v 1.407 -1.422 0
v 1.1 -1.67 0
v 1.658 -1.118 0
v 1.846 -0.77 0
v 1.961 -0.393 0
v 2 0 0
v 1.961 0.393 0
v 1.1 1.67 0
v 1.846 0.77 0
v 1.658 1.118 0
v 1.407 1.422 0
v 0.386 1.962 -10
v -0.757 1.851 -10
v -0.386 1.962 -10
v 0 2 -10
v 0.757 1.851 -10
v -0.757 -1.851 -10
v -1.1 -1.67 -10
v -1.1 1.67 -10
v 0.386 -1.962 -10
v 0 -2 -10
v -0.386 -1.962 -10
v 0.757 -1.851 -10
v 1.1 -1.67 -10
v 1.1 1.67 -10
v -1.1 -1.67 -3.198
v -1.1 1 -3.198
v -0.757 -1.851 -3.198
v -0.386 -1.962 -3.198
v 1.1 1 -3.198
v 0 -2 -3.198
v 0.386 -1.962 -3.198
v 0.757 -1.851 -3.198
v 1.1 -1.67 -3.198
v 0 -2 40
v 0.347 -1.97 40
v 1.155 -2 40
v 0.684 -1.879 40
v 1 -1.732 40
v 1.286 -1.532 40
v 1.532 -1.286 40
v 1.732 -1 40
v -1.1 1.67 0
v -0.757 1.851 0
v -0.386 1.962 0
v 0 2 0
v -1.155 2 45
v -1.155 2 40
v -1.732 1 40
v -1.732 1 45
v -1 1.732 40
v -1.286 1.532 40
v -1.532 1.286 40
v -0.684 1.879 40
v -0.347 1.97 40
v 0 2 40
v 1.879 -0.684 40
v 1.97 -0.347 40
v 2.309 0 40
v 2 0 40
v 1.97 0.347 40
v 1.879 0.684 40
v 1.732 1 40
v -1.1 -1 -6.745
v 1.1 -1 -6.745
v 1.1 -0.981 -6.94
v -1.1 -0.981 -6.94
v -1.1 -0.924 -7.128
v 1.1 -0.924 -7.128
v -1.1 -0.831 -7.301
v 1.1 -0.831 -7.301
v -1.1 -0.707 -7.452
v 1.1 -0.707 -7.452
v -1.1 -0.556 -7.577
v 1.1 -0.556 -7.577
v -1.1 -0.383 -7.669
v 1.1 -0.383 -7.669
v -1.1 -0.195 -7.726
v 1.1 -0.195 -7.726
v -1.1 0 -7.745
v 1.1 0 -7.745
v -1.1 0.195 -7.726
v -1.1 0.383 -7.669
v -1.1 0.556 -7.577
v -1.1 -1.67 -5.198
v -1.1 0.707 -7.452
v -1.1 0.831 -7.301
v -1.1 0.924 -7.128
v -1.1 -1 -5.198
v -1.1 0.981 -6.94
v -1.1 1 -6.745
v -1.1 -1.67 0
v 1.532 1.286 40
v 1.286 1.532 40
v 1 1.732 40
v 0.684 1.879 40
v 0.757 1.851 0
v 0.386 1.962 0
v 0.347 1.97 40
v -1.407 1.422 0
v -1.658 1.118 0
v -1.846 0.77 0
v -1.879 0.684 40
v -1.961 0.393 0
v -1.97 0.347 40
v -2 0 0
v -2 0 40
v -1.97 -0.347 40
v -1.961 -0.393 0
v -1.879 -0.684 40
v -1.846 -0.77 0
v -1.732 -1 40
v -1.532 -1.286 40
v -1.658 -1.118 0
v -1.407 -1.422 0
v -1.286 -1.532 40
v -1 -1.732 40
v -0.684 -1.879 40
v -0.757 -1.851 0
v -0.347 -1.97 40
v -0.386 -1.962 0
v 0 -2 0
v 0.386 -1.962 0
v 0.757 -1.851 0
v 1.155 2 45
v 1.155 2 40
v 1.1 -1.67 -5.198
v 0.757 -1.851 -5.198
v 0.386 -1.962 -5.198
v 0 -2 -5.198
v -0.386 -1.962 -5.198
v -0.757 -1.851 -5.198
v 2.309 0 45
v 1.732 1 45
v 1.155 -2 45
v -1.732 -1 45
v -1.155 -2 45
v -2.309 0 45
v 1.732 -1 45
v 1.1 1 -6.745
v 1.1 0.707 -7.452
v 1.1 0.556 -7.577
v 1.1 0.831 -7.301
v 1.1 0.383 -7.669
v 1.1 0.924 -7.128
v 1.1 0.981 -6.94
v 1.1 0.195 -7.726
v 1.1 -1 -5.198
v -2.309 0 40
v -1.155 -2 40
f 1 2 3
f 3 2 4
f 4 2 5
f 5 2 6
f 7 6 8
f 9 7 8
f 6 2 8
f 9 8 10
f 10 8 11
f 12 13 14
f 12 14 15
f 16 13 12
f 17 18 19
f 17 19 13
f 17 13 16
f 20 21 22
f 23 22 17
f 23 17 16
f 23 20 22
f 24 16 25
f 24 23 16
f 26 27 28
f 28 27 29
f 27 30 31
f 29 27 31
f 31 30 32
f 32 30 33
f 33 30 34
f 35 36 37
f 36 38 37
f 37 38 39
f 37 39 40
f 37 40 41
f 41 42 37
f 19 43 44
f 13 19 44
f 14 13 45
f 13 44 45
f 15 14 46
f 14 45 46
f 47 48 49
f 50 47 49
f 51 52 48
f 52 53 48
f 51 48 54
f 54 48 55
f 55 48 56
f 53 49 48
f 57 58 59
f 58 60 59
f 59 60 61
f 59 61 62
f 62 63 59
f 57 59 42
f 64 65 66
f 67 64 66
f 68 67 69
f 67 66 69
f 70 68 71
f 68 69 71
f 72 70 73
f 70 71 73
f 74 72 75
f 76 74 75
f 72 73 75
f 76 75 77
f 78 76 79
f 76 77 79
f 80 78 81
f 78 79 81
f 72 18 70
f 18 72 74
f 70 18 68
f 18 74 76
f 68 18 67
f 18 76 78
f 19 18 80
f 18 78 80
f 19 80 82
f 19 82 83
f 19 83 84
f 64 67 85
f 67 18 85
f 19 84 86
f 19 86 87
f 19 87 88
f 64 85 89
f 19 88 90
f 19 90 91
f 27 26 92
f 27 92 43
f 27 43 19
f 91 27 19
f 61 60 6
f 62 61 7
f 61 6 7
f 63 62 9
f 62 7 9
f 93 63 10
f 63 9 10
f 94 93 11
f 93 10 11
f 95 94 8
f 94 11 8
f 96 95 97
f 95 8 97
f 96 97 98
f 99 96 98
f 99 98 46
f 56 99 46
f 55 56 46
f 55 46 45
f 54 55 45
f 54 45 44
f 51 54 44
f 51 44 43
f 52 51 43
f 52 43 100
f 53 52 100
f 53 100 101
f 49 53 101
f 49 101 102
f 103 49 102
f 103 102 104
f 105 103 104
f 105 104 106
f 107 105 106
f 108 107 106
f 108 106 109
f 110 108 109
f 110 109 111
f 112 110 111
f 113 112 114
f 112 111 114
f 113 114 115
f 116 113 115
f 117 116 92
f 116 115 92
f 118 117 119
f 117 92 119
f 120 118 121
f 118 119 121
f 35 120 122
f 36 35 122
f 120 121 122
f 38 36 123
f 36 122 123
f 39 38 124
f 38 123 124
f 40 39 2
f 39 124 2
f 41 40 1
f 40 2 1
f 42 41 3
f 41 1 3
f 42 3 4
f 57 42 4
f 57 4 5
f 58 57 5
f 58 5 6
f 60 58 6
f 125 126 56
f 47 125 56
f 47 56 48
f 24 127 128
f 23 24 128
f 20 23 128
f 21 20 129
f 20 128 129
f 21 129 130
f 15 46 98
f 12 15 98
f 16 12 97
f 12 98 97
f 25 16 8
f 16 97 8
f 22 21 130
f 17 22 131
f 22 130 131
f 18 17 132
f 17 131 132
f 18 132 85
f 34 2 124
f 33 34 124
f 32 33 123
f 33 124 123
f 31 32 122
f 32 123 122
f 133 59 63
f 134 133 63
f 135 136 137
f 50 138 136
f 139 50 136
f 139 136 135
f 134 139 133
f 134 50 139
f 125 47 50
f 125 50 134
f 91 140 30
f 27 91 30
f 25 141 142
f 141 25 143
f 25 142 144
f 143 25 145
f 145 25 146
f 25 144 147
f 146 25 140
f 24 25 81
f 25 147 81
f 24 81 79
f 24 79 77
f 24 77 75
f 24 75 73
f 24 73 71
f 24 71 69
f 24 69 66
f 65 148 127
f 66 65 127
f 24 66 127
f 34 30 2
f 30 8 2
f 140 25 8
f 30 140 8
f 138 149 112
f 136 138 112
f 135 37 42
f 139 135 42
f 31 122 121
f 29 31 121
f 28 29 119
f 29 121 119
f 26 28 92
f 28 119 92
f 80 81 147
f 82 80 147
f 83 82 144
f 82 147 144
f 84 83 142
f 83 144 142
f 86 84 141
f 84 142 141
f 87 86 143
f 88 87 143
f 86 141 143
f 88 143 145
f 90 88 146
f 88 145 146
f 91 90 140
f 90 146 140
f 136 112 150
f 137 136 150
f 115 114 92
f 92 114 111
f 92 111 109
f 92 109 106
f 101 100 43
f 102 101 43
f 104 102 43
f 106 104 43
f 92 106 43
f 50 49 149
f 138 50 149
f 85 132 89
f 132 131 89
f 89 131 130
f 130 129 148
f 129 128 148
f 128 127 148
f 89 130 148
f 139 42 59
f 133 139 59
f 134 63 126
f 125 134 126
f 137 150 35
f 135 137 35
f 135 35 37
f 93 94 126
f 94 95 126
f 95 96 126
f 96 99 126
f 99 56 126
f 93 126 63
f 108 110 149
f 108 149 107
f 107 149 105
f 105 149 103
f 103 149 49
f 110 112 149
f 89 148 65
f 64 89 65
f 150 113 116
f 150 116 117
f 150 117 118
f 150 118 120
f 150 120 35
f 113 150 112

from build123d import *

# Parameters (mm, degrees)
F0_R     = 2
F1_DEPTH = 40
F3_DEPTH = 5
F5_DEPTH = 10
F6_W     = 0.9371294279
F6_H     = 2
F6_W_2   = 0.6703293088
F6_W_3   = 1
F7_DEPTH = 25


with BuildPart() as f1:
    # F0 (on Top) → F1 (new body)
    with BuildSketch(Plane.XY):
        Circle(F0_R)
    extrude(amount=F1_DEPTH)

    # F2 (on face) → F3 (join)
    with BuildSketch(Plane.XY.offset(40)):
        with BuildLine():
            Line((0, 2), (-1.1547005384, 2))
            Line((-1.1547005384, 2), (-1.7320507826, 1.0000000433))
            ThreePointArc((-1.7320507826, 1.0000000433), (-0.9999999783, 1.7320508201), (0, 2))
        make_face()
        with BuildLine():
            ThreePointArc((-1.7320507826, -1.0000000433), (-2, 0), (-1.7320507826, 1.0000000433))
            Line((-1.7320507826, 1.0000000433), (-2.3094010768, 0))
            Line((-2.3094010768, 0), (-1.7320507826, -1.0000000433))
        make_face()
        with BuildLine():
            ThreePointArc((0, -2), (-0.9999999783, -1.7320508201), (-1.7320507826, -1.0000000433))
            Line((-1.7320507826, -1.0000000433), (-1.1547005384, -2))
            Line((-1.1547005384, -2), (0, -2))
        make_face()
        with BuildLine():
            ThreePointArc((1.7320507983, -1.0000000161), (0.999999992, -1.7320508122), (0, -2))
            Line((0, -2), (1.1547005384, -2))
            Line((1.1547005384, -2), (1.7320507983, -1.0000000161))
        make_face()
        with BuildLine():
            Line((2.3094010768, 0), (1.7320507826, 1.0000000433))
            ThreePointArc((1.7320507826, 1.0000000433), (1.9318516461, 0.5176381144), (2, 0))
            ThreePointArc((2, 0), (1.9318516502, -0.5176380992), (1.7320507983, -1.0000000161))
            Line((1.7320507983, -1.0000000161), (2.3094010768, 0))
        make_face()
        with BuildLine():
            Line((1.1547005384, 2), (0, 2))
            ThreePointArc((0, 2), (0.9999999783, 1.7320508201), (1.7320507826, 1.0000000433))
            Line((1.7320507826, 1.0000000433), (1.1547005384, 2))
        make_face()
        with BuildLine():
            ThreePointArc((1.7320507826, 1.0000000433), (0.9999999783, 1.7320508201), (0, 2))
            ThreePointArc((0, 2), (-0.9999999783, 1.7320508201), (-1.7320507826, 1.0000000433))
            ThreePointArc((-1.7320507826, 1.0000000433), (-2, 0), (-1.7320507826, -1.0000000433))
            ThreePointArc((-1.7320507826, -1.0000000433), (-0.9999999783, -1.7320508201), (0, -2))
            ThreePointArc((0, -2), (0.999999992, -1.7320508122), (1.7320507983, -1.0000000161))
            ThreePointArc((1.7320507983, -1.0000000161), (1.9318516502, -0.5176380992), (2, 0))
            ThreePointArc((2, 0), (1.9318516461, 0.5176381144), (1.7320507826, 1.0000000433))
        make_face()
    extrude(amount=F3_DEPTH)

    # F4 (on face) → F5 (join)
    with BuildSketch(Plane(origin=(0, 0, 0), x_dir=(1, 0, 0), z_dir=(0, 0, -1))):
        with BuildLine():
            ThreePointArc((1.1, 1.6703293088), (0.5741695665, 1.915810353), (0, 2))
            ThreePointArc((0, 2), (-0.5741695665, 1.915810353), (-1.1, 1.6703293088))
            Line((-1.1, 1.6703293088), (-1.1, -1.6703293088))
            ThreePointArc((-1.1, -1.6703293088), (-0.5741695665, -1.915810353), (0, -2))
            ThreePointArc((0, -2), (0.5741695665, -1.915810353), (1.1, -1.6703293088))
            Line((1.1, -1.6703293088), (1.1, 1.6703293088))
        make_face()
    extrude(amount=F5_DEPTH)

    # F6 (on face) → F7 (cut)
    with BuildSketch(Plane.YZ.offset(1.1)):
        with Locations((-2.1388940228, -4.197623184)):
            Rectangle(F6_W, F6_H)
        with Locations((-1.3351646544, -4.197623184)):
            Rectangle(F6_W_2, F6_H)
        with Locations((-0.5, -4.197623184)):
            Rectangle(F6_W_3, F6_H)
        with BuildLine():
            Line((1, -3.197623184), (0, -3.197623184))
            Line((0, -3.197623184), (0, -5.197623184))
            Line((0, -5.197623184), (-1, -5.197623184))
            Line((-1, -5.197623184), (-1, -6.7451779507))
            ThreePointArc((-1, -6.7451779507), (-0.7071067812, -7.4522847319), (0, -7.7451779507))
            ThreePointArc((0, -7.7451779507), (0.7071067812, -7.4522847319), (1, -6.7451779507))
            Line((1, -6.7451779507), (1, -3.197623184))
        make_face()
    extrude(amount=-F7_DEPTH, mode=Mode.SUBTRACT)


solid = f1.part
